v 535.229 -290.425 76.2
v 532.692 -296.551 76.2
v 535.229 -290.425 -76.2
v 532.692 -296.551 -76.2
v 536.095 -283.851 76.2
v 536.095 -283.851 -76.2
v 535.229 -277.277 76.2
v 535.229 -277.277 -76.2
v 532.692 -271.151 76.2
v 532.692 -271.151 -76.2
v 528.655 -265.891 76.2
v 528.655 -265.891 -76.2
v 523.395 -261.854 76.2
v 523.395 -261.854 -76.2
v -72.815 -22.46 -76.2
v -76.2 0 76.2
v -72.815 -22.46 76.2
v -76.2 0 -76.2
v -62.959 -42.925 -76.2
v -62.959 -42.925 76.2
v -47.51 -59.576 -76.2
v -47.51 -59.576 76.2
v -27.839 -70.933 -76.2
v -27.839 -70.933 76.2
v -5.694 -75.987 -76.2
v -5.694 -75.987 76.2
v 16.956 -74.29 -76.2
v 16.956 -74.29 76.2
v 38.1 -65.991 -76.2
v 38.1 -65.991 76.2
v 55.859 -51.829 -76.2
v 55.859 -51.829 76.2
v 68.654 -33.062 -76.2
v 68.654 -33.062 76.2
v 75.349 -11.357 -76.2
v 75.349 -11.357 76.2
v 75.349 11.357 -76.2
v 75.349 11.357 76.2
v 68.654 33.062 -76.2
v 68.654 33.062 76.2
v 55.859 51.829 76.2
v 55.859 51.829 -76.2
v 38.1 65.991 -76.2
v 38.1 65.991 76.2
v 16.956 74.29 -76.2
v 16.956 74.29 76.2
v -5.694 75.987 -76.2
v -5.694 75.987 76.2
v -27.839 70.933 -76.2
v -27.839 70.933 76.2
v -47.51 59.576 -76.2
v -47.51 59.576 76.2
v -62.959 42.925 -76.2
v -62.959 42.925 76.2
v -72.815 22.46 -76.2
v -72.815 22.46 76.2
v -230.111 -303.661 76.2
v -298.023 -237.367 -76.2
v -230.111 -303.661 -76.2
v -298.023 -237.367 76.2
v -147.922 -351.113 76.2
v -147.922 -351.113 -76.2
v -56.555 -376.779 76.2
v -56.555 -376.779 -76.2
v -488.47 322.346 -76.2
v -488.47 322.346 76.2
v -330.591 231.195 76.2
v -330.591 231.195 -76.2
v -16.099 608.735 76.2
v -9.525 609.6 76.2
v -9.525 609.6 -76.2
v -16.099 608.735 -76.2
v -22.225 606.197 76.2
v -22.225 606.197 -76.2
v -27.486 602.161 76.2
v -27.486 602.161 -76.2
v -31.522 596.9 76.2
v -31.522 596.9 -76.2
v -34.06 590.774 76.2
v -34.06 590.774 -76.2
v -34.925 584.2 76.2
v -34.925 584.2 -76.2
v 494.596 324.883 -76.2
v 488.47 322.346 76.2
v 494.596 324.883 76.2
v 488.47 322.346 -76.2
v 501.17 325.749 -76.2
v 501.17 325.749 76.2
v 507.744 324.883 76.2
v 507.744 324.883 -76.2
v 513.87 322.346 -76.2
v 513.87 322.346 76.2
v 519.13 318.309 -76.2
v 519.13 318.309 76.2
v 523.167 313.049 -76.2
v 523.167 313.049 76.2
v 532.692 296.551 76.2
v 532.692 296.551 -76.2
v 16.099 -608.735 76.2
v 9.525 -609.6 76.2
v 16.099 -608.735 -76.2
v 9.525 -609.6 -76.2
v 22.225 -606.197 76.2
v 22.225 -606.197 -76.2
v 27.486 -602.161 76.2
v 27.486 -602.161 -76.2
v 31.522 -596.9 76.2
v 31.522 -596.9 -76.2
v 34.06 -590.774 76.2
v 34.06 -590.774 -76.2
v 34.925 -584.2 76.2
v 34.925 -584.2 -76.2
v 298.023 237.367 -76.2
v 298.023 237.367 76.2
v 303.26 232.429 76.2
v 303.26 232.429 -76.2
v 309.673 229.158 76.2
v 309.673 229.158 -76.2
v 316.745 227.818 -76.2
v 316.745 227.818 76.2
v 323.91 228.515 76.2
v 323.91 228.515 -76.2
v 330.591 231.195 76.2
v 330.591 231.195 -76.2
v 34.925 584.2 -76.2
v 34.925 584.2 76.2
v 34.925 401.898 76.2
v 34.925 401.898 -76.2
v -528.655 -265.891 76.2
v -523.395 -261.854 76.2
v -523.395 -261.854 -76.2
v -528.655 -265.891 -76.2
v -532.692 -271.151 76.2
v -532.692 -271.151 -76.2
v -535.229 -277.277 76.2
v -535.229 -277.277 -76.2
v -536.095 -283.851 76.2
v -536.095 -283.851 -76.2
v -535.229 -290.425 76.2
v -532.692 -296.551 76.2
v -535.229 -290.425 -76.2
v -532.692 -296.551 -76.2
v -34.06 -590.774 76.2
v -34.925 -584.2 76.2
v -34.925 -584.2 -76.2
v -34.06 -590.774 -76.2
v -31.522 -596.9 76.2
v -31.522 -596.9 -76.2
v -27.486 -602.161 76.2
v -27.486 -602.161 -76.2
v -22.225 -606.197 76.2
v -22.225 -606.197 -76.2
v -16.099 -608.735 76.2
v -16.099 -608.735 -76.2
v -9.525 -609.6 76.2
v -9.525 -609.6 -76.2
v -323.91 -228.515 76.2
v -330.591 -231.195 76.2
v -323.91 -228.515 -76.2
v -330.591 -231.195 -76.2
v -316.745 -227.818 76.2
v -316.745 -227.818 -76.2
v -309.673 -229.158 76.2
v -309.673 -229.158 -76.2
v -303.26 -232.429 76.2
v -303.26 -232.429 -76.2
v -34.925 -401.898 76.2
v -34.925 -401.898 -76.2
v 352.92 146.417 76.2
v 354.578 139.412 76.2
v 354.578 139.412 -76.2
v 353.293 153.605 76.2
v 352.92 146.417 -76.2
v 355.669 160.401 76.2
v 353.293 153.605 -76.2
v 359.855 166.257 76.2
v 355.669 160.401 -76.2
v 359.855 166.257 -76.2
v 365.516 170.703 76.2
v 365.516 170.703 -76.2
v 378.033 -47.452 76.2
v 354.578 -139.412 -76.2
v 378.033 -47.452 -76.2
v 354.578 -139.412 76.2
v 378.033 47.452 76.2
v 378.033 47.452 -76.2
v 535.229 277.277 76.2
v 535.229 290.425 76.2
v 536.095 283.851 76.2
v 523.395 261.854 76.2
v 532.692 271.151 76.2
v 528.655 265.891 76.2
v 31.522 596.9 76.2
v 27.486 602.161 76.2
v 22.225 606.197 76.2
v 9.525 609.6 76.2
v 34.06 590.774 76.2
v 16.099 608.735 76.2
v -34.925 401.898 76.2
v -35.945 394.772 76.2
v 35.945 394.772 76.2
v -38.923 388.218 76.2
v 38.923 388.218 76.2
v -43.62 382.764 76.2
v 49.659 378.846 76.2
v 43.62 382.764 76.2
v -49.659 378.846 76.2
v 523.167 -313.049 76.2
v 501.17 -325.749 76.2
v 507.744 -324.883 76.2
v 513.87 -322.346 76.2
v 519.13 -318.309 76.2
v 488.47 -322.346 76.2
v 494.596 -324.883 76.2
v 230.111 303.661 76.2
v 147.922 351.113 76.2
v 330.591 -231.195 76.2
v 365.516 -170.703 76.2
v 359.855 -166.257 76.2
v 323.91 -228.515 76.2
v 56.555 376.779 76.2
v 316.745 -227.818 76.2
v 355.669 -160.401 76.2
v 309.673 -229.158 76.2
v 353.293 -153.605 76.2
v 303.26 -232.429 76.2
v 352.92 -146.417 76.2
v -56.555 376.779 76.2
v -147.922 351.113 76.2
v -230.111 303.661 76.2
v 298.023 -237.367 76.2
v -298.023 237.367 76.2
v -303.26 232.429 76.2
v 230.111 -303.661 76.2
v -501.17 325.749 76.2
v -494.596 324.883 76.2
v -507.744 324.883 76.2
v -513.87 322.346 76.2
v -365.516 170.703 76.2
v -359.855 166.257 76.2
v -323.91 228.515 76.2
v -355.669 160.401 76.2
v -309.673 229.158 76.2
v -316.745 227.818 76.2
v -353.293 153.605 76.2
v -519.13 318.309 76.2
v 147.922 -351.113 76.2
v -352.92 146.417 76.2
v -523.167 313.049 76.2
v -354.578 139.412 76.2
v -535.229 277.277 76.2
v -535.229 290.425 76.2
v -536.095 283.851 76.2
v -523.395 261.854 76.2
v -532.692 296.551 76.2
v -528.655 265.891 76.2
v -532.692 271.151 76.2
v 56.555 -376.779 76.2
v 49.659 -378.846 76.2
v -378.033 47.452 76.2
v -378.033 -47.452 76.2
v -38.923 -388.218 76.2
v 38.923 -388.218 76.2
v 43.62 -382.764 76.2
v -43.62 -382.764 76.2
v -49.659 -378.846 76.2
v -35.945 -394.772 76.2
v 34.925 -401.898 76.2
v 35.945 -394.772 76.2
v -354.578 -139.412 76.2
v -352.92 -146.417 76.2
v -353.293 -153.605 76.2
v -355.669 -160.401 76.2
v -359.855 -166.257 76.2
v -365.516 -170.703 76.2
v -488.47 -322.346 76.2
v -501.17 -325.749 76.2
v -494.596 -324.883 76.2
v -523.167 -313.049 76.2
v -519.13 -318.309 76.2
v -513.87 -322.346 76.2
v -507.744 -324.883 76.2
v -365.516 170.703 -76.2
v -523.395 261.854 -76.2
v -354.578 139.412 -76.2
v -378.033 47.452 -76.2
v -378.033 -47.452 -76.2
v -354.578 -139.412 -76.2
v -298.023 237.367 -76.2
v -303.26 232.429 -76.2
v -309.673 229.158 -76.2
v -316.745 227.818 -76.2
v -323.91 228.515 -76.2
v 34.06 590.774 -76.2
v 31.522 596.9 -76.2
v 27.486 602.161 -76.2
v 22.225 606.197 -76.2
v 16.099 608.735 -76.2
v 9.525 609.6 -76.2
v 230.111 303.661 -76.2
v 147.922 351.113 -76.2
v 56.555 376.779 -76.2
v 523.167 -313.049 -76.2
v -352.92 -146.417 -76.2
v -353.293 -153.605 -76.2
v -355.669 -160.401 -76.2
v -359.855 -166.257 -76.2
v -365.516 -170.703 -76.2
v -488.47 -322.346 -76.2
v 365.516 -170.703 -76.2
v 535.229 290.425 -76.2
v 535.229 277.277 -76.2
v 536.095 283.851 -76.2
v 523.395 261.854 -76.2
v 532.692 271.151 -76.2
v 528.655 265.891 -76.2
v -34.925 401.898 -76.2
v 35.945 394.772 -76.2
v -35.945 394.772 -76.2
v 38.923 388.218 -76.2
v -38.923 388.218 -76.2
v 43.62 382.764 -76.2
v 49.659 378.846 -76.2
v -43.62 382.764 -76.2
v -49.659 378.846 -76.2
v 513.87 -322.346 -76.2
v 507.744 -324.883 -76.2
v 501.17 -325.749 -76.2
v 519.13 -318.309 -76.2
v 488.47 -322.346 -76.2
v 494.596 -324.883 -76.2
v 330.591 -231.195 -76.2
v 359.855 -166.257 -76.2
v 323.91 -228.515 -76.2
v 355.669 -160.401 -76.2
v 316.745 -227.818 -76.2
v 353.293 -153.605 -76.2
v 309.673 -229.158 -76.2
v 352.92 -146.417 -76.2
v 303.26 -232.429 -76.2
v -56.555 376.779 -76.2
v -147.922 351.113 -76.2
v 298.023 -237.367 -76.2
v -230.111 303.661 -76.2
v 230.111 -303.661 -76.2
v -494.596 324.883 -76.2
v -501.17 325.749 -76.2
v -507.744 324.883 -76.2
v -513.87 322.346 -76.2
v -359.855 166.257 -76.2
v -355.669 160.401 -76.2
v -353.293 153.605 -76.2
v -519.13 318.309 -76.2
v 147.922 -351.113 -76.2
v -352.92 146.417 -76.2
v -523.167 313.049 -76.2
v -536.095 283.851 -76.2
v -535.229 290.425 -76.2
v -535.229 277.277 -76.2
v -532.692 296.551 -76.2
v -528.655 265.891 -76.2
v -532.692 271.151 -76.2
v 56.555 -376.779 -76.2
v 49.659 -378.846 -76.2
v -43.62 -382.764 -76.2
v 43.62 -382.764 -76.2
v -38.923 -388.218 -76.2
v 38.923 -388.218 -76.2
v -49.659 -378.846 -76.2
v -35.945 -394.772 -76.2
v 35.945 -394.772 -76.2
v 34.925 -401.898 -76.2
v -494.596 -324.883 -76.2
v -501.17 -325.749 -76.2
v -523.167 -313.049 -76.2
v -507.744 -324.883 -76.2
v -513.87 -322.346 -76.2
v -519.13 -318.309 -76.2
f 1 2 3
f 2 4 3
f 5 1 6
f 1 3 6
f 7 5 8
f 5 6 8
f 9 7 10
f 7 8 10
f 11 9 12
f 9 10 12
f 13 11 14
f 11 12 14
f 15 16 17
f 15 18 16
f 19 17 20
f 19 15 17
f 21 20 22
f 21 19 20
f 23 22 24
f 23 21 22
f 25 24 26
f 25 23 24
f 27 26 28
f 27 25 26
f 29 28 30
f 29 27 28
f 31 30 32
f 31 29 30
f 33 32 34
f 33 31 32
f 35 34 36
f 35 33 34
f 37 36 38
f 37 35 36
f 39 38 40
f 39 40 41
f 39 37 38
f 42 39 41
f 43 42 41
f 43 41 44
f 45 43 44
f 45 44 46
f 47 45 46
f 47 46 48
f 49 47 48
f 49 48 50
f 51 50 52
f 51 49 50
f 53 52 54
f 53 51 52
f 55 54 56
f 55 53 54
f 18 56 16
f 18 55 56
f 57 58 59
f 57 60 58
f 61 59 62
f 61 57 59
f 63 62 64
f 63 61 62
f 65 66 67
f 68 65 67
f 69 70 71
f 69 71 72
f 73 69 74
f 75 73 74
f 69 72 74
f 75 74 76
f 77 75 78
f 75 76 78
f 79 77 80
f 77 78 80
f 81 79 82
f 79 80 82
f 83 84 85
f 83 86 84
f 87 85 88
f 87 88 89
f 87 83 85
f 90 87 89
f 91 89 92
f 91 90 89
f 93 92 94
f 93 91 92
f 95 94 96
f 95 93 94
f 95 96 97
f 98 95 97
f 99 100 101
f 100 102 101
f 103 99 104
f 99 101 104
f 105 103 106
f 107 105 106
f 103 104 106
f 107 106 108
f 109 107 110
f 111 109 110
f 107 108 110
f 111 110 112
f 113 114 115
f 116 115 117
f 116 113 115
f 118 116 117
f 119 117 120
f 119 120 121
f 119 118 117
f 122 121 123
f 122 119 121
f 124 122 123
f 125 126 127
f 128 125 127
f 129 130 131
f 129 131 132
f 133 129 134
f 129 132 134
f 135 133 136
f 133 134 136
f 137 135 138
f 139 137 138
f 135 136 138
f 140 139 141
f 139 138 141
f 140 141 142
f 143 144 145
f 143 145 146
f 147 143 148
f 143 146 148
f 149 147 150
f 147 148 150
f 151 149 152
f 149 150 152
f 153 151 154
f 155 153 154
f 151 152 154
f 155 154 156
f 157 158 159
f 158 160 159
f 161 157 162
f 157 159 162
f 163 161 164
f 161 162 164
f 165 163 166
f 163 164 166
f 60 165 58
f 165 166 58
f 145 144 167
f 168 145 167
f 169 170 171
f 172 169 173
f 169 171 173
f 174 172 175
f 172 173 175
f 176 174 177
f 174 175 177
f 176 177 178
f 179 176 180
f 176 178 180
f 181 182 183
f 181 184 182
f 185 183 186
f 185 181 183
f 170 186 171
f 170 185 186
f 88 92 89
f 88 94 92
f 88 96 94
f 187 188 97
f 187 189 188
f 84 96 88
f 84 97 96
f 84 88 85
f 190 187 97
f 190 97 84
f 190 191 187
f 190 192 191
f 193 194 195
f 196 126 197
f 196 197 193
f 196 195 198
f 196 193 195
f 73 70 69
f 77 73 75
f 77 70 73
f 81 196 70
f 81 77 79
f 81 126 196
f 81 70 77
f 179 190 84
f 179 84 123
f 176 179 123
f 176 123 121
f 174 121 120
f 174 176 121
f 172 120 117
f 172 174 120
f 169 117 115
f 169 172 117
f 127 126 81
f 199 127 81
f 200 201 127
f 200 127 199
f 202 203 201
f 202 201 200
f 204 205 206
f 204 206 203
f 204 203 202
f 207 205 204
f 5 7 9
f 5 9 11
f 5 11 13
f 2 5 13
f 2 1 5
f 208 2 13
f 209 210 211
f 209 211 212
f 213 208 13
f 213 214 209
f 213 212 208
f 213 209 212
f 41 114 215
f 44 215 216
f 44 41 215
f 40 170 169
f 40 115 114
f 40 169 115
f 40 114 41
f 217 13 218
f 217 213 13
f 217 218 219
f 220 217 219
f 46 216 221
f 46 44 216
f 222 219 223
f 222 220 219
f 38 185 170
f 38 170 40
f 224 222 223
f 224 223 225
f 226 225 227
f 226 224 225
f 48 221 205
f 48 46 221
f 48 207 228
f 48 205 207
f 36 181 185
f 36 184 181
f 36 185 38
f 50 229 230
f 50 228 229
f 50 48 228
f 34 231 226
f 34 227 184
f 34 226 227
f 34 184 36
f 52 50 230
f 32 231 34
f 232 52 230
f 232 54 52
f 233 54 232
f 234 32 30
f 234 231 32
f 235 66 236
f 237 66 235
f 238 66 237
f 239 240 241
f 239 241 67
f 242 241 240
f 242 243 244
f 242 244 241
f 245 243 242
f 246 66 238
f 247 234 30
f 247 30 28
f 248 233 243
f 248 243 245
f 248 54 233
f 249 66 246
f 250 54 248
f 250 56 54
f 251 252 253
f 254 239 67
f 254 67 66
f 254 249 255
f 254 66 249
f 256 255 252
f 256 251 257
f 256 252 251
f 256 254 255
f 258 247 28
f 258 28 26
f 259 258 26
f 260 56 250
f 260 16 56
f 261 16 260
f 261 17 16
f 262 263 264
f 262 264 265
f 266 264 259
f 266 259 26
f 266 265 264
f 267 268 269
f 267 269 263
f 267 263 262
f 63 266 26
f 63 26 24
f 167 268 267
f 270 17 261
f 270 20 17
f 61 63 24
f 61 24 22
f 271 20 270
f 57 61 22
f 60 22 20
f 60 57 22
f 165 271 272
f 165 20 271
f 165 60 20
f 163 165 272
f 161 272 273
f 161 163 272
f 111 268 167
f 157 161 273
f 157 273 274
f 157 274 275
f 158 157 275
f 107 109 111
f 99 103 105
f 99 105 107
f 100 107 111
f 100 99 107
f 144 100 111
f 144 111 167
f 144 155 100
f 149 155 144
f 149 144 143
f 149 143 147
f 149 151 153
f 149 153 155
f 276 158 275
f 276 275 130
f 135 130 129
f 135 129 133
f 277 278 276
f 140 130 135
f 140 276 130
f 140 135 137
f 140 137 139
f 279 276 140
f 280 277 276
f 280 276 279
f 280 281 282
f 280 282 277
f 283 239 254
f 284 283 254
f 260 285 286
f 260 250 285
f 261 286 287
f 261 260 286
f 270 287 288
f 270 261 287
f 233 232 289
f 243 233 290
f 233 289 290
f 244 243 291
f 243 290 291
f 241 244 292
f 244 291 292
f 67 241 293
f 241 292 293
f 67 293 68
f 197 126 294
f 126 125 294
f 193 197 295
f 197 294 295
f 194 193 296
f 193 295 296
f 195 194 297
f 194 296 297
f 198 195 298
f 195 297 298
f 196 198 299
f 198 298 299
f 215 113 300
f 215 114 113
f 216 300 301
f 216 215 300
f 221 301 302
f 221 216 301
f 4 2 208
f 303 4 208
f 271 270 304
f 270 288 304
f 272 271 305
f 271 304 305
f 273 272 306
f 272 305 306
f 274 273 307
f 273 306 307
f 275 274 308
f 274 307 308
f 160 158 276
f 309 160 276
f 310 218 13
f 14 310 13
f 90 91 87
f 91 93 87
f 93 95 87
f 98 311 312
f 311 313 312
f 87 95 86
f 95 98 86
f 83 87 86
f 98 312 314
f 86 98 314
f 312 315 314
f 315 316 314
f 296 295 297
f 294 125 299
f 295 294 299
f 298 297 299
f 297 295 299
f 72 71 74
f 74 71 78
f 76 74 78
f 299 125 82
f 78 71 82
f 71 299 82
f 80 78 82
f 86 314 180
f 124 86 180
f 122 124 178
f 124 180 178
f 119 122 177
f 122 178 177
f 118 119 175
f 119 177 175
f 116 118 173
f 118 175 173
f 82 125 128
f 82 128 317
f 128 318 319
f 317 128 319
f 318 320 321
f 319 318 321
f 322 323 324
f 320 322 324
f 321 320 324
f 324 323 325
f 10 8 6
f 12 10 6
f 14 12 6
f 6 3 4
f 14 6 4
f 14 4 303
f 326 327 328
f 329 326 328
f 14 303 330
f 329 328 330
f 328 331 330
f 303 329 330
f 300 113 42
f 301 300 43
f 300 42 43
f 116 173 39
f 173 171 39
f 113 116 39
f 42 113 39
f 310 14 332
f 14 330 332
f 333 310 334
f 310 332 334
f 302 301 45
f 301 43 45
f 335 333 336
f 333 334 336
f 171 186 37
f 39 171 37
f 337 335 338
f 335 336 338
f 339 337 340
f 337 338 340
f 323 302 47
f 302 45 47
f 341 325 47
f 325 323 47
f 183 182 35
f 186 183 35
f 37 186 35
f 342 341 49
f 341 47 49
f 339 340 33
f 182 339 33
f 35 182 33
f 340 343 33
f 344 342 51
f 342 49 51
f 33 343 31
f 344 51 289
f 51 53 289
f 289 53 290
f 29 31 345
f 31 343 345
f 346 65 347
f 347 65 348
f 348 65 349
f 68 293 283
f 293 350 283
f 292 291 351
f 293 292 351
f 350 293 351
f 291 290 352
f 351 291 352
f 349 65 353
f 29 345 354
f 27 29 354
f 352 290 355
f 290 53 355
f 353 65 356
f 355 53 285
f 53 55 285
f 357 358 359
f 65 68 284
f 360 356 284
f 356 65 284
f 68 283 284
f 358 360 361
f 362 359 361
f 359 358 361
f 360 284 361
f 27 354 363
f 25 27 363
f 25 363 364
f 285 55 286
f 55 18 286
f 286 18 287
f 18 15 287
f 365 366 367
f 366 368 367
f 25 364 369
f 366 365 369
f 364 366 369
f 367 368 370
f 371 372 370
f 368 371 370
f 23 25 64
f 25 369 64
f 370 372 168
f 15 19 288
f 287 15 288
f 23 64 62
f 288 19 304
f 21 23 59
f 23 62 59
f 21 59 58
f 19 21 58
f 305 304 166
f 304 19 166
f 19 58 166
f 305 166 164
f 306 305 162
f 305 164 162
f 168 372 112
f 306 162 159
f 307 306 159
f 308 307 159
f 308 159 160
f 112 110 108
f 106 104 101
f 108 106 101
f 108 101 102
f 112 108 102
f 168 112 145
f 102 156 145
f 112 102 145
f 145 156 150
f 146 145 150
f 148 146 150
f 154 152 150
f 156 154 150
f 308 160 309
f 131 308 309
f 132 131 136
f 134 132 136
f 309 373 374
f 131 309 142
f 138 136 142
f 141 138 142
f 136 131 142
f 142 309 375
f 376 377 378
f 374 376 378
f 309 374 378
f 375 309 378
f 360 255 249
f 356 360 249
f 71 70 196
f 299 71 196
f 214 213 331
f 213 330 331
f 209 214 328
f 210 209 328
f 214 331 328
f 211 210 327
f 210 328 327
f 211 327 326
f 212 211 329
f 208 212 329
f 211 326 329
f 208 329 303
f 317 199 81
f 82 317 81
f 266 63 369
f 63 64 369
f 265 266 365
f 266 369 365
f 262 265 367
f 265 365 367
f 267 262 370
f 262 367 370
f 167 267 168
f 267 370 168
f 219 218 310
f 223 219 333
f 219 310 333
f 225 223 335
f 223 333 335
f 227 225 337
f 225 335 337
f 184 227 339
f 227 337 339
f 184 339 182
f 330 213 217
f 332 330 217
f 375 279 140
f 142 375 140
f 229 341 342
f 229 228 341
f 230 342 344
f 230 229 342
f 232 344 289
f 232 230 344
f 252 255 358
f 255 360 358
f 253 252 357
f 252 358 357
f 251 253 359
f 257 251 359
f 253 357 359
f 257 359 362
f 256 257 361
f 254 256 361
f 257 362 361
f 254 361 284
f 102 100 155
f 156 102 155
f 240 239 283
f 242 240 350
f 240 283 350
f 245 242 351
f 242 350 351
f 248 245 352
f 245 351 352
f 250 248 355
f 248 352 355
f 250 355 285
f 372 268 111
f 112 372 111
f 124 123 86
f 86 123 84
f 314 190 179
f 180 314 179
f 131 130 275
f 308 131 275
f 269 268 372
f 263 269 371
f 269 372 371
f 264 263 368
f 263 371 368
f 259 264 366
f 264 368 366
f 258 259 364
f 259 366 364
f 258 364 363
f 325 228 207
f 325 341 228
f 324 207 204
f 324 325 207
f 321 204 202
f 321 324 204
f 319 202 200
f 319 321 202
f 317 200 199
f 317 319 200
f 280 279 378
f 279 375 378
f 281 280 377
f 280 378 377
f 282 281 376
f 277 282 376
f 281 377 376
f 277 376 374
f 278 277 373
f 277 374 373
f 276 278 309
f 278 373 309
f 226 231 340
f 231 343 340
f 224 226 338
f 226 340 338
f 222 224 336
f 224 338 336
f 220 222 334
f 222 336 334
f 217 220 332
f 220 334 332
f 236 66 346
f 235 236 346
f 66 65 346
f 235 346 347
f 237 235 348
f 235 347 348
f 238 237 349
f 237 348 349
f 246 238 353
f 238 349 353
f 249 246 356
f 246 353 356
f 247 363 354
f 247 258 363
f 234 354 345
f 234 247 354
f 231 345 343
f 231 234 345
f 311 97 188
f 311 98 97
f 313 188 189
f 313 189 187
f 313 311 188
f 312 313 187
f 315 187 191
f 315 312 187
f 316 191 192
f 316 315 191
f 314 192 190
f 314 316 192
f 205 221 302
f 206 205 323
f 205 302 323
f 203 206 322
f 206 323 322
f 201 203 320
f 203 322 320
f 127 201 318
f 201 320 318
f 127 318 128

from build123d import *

# Parameters (mm, degrees)
SKETCH1_R                = 381
SKETCH1_R_2              = 76.2
BOSS_EXTRUDE1_DEPTH      = 76.2
BOSS_EXTRUDE2_DEPTH      = 152.4
FILLET1_R                = 25.4
CIRPATTERN1_COUNT        = 6
FILLET1_OF_CIRPATTERN1_R = 25.4


with BuildPart() as part:
    # Sketch1 → Boss-Extrude1 (new, symmetric)
    with BuildSketch(Plane.XY):
        with Locations(Location((0, 0, 0), (0, 0, 180))):
            Circle(SKETCH1_R)
        with Locations(Location((0, 0, 0), (0, 0, 180))):
            Circle(SKETCH1_R_2, mode=Mode.SUBTRACT)
    extrude(amount=BOSS_EXTRUDE1_DEPTH, both=True)

    # Sketch2 → Boss-Extrude2 (add)
    with BuildSketch(Plane.XY.offset(76.2)):
        with BuildLine():
            Line((-34.925, 379.395893988), (-34.925, 609.6))
            Line((-34.925, 609.6), (34.925, 609.6))
            Line((34.925, 609.6), (34.925, 379.395893988))
            ThreePointArc((34.925, 379.395893988), (0, 381), (-34.925, 379.395893988))
        make_face()
    boss_extrude2 = extrude(amount=-BOSS_EXTRUDE2_DEPTH)

    # Fillet1
    fillet1_edges = [part.edges().sort_by_distance(p)[0] for p in [
        (34.925, 379.395893988, 0),
        (-34.925, 379.395893988, 0),
        (-34.925, 609.6, 0),
        (34.925, 609.6, 0),
    ]]
    fillet(fillet1_edges, radius=FILLET1_R)

    # CirPattern1: Boss-Extrude2 ×6 about axis
    cirpattern1_axis = Axis((0, 0, 0), (0, 0, 1))
    for i in range(1, CIRPATTERN1_COUNT):
        add(boss_extrude2.rotate(cirpattern1_axis, i * 360 / CIRPATTERN1_COUNT))

    # Fillet1 of CirPattern1
    fillet1_of_cirpattern1_edges = [part.edges().sort_by_distance(p)[0] for p in [
        (-311.103982285, 219.943884221, 0),
        (-346.028982285, 159.452009767, 0),
        (-545.391586147, 274.554062773, 0),
        (-510.466586147, 335.045937227, 0),
        (-346.028982285, -159.452009767, 0),
        (-311.103982285, -219.943884221, 0),
        (-510.466586147, -335.045937227, 0),
        (-545.391586147, -274.554062773, 0),
        (-34.925, -379.395893988, 0),
        (34.925, -379.395893988, 0),
        (34.925, -609.6, 0),
        (-34.925, -609.6, 0),
        (311.103982285, -219.943884221, 0),
        (346.028982285, -159.452009767, 0),
        (545.391586147, -274.554062773, 0),
        (510.466586147, -335.045937227, 0),
        (346.028982285, 159.452009767, 0),
        (311.103982285, 219.943884221, 0),
        (510.466586147, 335.045937227, 0),
        (545.391586147, 274.554062773, 0),
    ]]
    fillet(fillet1_of_cirpattern1_edges, radius=FILLET1_OF_CIRPATTERN1_R)


solid = part.part
